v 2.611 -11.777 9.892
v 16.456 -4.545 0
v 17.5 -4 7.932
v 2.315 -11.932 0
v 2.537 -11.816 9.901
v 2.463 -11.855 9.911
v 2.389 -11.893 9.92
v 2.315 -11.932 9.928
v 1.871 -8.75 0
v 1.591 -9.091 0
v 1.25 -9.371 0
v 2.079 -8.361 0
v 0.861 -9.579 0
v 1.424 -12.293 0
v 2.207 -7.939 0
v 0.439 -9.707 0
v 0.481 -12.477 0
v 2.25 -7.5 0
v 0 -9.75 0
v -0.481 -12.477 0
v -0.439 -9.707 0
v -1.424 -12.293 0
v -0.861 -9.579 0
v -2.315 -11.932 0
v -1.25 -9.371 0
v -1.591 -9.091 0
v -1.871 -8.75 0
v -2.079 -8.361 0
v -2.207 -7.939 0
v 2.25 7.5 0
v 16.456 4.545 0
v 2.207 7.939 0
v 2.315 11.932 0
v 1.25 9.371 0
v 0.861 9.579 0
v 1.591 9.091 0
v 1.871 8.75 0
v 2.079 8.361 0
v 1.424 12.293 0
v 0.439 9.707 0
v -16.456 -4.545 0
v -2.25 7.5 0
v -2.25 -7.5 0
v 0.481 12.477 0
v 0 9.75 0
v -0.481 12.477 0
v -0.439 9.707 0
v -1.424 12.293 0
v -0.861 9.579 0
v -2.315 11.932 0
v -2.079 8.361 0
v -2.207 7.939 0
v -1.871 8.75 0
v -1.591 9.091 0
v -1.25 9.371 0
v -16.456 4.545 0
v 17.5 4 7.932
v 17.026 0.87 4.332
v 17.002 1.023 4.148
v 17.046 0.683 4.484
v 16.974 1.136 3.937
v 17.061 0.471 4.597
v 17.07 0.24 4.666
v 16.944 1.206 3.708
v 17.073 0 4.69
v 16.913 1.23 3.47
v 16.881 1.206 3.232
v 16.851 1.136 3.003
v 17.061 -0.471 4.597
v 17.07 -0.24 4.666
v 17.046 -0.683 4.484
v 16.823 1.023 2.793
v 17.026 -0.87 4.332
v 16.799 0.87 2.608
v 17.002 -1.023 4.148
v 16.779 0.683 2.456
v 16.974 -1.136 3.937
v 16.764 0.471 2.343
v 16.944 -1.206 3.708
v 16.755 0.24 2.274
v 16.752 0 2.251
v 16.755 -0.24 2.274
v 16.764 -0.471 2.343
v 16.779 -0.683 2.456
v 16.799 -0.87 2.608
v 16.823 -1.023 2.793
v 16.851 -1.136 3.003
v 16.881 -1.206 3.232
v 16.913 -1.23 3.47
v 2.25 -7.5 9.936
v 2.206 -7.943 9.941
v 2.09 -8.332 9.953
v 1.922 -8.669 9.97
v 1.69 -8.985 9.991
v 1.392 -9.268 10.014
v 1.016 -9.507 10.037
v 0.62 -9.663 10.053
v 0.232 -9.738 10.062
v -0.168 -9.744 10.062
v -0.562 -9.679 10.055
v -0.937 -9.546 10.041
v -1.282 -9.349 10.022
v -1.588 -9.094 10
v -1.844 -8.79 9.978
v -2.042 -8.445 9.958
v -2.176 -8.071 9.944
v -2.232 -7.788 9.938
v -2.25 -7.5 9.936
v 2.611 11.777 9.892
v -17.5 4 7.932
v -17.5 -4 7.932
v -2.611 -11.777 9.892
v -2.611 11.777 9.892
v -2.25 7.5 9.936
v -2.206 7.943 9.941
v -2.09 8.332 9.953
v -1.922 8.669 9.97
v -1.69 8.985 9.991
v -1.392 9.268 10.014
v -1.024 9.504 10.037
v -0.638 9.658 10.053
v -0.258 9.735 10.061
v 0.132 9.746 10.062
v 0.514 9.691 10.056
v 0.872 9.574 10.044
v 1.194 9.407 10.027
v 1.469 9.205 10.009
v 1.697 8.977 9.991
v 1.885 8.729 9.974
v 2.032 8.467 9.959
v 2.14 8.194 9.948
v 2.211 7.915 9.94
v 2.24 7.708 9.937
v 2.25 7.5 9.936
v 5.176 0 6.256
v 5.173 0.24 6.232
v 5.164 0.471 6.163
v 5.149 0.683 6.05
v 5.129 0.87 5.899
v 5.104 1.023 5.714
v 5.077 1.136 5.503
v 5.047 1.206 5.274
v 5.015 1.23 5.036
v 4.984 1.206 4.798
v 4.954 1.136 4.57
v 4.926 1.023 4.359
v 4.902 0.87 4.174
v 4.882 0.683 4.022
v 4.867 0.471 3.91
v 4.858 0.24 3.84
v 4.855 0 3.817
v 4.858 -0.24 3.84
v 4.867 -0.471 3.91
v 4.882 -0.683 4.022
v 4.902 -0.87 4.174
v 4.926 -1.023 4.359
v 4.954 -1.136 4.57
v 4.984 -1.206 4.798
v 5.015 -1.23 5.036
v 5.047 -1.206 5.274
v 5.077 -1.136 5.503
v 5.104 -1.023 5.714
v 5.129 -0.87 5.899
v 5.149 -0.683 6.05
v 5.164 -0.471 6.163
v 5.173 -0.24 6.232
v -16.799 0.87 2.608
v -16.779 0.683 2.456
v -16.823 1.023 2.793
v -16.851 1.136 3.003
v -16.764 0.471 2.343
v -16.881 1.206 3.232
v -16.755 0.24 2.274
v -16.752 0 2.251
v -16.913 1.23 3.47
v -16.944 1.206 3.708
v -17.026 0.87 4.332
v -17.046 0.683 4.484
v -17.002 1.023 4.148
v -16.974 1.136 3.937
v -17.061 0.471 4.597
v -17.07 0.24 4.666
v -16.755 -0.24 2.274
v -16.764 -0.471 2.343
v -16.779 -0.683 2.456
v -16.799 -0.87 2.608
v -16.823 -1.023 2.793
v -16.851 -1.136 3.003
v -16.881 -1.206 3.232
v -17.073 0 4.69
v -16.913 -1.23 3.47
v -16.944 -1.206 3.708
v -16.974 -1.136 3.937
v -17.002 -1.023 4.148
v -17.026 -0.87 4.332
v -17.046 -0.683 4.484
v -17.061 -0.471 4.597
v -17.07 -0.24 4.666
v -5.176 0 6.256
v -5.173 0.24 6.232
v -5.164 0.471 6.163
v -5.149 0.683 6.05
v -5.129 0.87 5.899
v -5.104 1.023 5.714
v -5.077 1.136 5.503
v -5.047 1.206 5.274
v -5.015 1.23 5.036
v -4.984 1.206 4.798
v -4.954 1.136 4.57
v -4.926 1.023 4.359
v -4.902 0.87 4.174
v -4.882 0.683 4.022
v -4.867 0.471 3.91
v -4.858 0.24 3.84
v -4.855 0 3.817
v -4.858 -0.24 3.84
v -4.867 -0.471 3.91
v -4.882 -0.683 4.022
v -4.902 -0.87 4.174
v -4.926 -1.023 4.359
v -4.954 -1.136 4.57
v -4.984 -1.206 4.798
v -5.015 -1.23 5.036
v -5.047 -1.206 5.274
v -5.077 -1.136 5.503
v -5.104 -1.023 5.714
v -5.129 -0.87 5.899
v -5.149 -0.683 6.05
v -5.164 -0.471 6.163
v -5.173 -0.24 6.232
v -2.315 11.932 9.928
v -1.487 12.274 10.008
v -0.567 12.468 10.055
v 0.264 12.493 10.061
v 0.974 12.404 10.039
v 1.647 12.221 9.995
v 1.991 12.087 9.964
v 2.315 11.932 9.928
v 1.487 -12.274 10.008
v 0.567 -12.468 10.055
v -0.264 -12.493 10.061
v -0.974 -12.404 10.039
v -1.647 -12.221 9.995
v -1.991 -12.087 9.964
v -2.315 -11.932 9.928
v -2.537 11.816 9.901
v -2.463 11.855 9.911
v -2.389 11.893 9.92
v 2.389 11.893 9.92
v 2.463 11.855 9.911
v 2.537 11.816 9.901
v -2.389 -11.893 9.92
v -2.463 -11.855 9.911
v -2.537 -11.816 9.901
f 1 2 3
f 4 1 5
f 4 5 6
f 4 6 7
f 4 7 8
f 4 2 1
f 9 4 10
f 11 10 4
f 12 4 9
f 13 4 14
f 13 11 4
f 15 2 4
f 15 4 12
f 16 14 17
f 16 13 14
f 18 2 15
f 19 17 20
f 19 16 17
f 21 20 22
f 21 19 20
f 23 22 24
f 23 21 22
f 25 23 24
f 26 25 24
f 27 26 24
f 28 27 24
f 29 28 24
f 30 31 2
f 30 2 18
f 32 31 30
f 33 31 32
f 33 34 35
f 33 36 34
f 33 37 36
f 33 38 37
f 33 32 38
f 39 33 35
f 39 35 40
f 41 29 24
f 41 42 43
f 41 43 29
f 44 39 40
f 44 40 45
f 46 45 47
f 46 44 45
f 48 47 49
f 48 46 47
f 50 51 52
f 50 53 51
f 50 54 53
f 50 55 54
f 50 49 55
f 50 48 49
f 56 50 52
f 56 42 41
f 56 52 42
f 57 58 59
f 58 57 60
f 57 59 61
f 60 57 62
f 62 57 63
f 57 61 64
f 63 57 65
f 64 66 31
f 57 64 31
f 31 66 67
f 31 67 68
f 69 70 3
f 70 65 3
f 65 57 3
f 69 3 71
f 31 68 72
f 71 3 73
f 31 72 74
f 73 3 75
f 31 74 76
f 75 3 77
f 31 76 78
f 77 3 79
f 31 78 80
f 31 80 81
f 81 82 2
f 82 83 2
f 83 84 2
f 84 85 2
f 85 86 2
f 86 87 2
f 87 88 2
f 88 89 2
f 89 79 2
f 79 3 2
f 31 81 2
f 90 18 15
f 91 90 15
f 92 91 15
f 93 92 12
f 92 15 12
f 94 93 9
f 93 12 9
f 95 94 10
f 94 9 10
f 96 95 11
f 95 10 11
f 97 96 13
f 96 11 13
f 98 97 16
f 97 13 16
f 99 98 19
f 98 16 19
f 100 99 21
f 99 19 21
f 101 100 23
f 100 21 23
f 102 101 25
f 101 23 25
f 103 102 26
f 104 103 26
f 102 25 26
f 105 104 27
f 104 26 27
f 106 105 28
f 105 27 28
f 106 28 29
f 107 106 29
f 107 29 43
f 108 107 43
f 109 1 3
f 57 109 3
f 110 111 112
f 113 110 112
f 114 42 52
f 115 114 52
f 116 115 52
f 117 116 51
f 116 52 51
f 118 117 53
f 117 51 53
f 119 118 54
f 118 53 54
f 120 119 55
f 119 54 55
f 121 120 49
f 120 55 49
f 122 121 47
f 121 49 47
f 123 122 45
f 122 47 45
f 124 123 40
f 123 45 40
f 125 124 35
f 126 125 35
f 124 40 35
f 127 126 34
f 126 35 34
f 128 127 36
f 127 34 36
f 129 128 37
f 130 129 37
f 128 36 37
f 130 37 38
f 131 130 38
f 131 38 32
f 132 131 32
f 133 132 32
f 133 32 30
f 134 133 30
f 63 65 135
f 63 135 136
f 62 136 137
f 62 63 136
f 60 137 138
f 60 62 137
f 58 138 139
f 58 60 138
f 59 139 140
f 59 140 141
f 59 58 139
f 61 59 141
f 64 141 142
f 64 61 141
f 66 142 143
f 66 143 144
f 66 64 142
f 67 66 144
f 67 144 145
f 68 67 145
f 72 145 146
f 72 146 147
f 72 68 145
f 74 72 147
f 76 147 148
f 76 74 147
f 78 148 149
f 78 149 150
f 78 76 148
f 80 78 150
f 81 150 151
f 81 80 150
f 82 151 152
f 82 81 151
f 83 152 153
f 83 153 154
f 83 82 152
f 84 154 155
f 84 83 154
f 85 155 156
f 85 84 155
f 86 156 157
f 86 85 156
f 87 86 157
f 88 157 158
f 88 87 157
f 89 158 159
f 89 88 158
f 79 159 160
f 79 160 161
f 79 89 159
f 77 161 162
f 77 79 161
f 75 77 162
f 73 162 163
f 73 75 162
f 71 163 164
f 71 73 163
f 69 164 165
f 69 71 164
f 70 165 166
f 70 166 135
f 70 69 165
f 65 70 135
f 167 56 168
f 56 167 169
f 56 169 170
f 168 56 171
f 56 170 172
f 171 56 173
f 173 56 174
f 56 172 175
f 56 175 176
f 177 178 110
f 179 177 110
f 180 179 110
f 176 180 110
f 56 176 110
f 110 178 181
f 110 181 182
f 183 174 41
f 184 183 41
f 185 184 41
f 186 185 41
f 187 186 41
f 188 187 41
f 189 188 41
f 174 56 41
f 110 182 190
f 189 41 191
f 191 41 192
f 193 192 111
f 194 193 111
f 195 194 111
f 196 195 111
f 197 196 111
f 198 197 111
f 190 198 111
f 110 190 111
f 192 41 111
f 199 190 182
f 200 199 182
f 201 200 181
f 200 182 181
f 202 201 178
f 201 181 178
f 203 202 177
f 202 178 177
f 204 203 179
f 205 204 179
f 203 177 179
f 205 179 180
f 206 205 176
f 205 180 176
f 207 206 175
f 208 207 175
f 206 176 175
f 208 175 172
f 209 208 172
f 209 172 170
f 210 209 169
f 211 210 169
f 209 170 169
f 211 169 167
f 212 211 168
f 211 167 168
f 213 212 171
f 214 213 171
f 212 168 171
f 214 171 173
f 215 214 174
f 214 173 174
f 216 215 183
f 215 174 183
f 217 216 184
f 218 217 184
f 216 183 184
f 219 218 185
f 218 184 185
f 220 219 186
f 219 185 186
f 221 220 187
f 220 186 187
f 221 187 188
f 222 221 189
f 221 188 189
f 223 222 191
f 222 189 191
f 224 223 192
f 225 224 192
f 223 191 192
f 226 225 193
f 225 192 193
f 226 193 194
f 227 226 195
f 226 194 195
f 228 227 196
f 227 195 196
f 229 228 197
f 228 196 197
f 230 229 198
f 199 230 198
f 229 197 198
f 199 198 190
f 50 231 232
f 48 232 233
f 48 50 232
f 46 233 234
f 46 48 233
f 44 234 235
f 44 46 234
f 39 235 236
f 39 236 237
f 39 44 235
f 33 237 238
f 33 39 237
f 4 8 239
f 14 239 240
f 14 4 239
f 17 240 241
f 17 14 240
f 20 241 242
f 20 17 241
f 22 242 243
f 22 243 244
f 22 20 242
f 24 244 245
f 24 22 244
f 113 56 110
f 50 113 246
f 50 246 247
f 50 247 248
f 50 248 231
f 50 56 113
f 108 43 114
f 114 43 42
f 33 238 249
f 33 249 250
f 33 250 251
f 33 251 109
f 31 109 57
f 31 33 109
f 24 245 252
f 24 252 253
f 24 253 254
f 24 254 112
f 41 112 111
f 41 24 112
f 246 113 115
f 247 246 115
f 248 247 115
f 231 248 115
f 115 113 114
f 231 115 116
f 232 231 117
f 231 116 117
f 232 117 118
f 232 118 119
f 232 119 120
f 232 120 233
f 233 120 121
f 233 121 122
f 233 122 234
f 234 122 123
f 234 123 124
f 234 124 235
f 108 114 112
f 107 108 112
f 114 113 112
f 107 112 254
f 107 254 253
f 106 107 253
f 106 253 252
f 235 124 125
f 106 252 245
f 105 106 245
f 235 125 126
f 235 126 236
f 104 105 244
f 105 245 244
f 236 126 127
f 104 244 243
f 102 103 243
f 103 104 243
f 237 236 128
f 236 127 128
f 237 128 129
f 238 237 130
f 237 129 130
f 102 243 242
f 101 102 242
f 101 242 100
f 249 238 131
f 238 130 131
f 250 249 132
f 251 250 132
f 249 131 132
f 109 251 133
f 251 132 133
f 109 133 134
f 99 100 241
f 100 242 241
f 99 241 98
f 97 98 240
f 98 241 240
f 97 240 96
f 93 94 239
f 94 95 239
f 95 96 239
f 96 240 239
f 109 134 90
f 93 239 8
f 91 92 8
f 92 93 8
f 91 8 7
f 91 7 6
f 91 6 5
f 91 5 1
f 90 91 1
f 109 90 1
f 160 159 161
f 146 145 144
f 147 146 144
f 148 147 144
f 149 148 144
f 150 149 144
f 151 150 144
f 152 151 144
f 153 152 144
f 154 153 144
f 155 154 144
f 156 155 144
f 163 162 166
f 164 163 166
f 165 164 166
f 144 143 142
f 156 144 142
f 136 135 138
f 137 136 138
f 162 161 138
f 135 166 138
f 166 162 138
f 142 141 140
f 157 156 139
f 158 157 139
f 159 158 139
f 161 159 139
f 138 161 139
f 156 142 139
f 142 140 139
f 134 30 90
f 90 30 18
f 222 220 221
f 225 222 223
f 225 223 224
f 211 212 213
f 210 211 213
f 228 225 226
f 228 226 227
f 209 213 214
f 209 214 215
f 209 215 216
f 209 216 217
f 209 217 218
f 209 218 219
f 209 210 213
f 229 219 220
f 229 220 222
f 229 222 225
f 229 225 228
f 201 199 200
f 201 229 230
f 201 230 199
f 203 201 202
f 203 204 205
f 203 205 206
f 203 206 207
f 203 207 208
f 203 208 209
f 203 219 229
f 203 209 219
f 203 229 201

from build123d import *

# Parameters (mm, degrees)
AUFSATZ_LINEAR_AUSTRAGEN3_DEPTH      = 20
SKIZZE10_OUTSIDE_W                   = 46.486
SKIZZE10_OUTSIDE_H                   = 31.486
SCHNITT_LINEAR_AUSTRAGEN9_DEPTH      = 13.5
SCHNITT_LINEAR_AUSTRAGEN9_DEPTH_BACK = 13.5
SKIZZE7_R                            = 1.23
SCHNITT_LINEAR_AUSTRAGEN8_DEPTH      = 12


with BuildPart() as part:
    # Skizze3 → Aufsatz-Linear austragen3 (new body)
    with BuildSketch(Plane.XY):
        with BuildLine():
            Line((-17.5, 4), (-2.314936357, 11.931824643))
            ThreePointArc((-2.314936357, 11.931824643), (0, 12.5), (2.314936357, 11.931824643))
            Line((2.314936357, 11.931824643), (17.5, 4))
            Line((17.5, 4), (17.5, -4))
            Line((17.5, -4), (2.314936357, -11.931824643))
            ThreePointArc((2.314936357, -11.931824643), (0, -12.5), (-2.314936357, -11.931824643))
            Line((-2.314936357, -11.931824643), (-17.5, -4))
            Line((-17.5, -4), (-17.5, 4))
        make_face()
        with BuildLine():
            Line((-2.25, -7.5), (-2.25, 7.5))
            ThreePointArc((-2.25, 7.5), (0, 9.75), (2.25, 7.5))
            Line((2.25, 7.5), (2.25, -7.5))
            ThreePointArc((2.25, -7.5), (0, -9.75), (-2.25, -7.5))
        make_face(mode=Mode.SUBTRACT)
    extrude(amount=AUFSATZ_LINEAR_AUSTRAGEN3_DEPTH)

    # Skizze10 outside → Schnitt-Linear austragen9 (cut, two sides)
    with BuildSketch(Plane(origin=(0, 0, 0), x_dir=(1, 0, 0), z_dir=(0, 1, 0))) as schnitt_linear_austragen9_sk:
        with Locations((0, -10)):
            Rectangle(SKIZZE10_OUTSIDE_W, SKIZZE10_OUTSIDE_H)
        with BuildLine():
            Line((-16.455790462, 0), (-17.5, -7.931558891))
            Line((-17.5, -7.931558891), (-2.610523844, -9.891795615))
            ThreePointArc((-2.610523844, -9.891795615), (0, -10.062898387), (2.610523844, -9.891795615))
            Line((2.610523844, -9.891795615), (17.5, -7.931558891))
            Line((17.5, -7.931558891), (16.455790462, 0))
            Line((16.455790462, 0), (-16.455790462, 0))
        make_face(mode=Mode.SUBTRACT)
    extrude(amount=SCHNITT_LINEAR_AUSTRAGEN9_DEPTH, mode=Mode.SUBTRACT)
    extrude(schnitt_linear_austragen9_sk.sketch, amount=-SCHNITT_LINEAR_AUSTRAGEN9_DEPTH_BACK, mode=Mode.SUBTRACT)

    # Skizze7 → Schnitt-Linear austragen8 (cut)
    with BuildSketch(Plane(origin=(-17.19638108, 0, 5.625344227), x_dir=(-0.130526192, 0, 0.991444861), z_dir=(-0.991444861, 0, -0.130526192))):
        with Locations((-2.173885101, 0)):
            Circle(SKIZZE7_R)
    schnitt_linear_austragen8 = extrude(amount=-SCHNITT_LINEAR_AUSTRAGEN8_DEPTH, mode=Mode.SUBTRACT)

    # Spiegeln4: Schnitt-Linear austragen8 across plane
    add(schnitt_linear_austragen8.mirror(Plane(origin=(0, 0, 0), x_dir=(0, 0, 1), z_dir=(1, 0, 0))), mode=Mode.SUBTRACT)


solid = part.part
